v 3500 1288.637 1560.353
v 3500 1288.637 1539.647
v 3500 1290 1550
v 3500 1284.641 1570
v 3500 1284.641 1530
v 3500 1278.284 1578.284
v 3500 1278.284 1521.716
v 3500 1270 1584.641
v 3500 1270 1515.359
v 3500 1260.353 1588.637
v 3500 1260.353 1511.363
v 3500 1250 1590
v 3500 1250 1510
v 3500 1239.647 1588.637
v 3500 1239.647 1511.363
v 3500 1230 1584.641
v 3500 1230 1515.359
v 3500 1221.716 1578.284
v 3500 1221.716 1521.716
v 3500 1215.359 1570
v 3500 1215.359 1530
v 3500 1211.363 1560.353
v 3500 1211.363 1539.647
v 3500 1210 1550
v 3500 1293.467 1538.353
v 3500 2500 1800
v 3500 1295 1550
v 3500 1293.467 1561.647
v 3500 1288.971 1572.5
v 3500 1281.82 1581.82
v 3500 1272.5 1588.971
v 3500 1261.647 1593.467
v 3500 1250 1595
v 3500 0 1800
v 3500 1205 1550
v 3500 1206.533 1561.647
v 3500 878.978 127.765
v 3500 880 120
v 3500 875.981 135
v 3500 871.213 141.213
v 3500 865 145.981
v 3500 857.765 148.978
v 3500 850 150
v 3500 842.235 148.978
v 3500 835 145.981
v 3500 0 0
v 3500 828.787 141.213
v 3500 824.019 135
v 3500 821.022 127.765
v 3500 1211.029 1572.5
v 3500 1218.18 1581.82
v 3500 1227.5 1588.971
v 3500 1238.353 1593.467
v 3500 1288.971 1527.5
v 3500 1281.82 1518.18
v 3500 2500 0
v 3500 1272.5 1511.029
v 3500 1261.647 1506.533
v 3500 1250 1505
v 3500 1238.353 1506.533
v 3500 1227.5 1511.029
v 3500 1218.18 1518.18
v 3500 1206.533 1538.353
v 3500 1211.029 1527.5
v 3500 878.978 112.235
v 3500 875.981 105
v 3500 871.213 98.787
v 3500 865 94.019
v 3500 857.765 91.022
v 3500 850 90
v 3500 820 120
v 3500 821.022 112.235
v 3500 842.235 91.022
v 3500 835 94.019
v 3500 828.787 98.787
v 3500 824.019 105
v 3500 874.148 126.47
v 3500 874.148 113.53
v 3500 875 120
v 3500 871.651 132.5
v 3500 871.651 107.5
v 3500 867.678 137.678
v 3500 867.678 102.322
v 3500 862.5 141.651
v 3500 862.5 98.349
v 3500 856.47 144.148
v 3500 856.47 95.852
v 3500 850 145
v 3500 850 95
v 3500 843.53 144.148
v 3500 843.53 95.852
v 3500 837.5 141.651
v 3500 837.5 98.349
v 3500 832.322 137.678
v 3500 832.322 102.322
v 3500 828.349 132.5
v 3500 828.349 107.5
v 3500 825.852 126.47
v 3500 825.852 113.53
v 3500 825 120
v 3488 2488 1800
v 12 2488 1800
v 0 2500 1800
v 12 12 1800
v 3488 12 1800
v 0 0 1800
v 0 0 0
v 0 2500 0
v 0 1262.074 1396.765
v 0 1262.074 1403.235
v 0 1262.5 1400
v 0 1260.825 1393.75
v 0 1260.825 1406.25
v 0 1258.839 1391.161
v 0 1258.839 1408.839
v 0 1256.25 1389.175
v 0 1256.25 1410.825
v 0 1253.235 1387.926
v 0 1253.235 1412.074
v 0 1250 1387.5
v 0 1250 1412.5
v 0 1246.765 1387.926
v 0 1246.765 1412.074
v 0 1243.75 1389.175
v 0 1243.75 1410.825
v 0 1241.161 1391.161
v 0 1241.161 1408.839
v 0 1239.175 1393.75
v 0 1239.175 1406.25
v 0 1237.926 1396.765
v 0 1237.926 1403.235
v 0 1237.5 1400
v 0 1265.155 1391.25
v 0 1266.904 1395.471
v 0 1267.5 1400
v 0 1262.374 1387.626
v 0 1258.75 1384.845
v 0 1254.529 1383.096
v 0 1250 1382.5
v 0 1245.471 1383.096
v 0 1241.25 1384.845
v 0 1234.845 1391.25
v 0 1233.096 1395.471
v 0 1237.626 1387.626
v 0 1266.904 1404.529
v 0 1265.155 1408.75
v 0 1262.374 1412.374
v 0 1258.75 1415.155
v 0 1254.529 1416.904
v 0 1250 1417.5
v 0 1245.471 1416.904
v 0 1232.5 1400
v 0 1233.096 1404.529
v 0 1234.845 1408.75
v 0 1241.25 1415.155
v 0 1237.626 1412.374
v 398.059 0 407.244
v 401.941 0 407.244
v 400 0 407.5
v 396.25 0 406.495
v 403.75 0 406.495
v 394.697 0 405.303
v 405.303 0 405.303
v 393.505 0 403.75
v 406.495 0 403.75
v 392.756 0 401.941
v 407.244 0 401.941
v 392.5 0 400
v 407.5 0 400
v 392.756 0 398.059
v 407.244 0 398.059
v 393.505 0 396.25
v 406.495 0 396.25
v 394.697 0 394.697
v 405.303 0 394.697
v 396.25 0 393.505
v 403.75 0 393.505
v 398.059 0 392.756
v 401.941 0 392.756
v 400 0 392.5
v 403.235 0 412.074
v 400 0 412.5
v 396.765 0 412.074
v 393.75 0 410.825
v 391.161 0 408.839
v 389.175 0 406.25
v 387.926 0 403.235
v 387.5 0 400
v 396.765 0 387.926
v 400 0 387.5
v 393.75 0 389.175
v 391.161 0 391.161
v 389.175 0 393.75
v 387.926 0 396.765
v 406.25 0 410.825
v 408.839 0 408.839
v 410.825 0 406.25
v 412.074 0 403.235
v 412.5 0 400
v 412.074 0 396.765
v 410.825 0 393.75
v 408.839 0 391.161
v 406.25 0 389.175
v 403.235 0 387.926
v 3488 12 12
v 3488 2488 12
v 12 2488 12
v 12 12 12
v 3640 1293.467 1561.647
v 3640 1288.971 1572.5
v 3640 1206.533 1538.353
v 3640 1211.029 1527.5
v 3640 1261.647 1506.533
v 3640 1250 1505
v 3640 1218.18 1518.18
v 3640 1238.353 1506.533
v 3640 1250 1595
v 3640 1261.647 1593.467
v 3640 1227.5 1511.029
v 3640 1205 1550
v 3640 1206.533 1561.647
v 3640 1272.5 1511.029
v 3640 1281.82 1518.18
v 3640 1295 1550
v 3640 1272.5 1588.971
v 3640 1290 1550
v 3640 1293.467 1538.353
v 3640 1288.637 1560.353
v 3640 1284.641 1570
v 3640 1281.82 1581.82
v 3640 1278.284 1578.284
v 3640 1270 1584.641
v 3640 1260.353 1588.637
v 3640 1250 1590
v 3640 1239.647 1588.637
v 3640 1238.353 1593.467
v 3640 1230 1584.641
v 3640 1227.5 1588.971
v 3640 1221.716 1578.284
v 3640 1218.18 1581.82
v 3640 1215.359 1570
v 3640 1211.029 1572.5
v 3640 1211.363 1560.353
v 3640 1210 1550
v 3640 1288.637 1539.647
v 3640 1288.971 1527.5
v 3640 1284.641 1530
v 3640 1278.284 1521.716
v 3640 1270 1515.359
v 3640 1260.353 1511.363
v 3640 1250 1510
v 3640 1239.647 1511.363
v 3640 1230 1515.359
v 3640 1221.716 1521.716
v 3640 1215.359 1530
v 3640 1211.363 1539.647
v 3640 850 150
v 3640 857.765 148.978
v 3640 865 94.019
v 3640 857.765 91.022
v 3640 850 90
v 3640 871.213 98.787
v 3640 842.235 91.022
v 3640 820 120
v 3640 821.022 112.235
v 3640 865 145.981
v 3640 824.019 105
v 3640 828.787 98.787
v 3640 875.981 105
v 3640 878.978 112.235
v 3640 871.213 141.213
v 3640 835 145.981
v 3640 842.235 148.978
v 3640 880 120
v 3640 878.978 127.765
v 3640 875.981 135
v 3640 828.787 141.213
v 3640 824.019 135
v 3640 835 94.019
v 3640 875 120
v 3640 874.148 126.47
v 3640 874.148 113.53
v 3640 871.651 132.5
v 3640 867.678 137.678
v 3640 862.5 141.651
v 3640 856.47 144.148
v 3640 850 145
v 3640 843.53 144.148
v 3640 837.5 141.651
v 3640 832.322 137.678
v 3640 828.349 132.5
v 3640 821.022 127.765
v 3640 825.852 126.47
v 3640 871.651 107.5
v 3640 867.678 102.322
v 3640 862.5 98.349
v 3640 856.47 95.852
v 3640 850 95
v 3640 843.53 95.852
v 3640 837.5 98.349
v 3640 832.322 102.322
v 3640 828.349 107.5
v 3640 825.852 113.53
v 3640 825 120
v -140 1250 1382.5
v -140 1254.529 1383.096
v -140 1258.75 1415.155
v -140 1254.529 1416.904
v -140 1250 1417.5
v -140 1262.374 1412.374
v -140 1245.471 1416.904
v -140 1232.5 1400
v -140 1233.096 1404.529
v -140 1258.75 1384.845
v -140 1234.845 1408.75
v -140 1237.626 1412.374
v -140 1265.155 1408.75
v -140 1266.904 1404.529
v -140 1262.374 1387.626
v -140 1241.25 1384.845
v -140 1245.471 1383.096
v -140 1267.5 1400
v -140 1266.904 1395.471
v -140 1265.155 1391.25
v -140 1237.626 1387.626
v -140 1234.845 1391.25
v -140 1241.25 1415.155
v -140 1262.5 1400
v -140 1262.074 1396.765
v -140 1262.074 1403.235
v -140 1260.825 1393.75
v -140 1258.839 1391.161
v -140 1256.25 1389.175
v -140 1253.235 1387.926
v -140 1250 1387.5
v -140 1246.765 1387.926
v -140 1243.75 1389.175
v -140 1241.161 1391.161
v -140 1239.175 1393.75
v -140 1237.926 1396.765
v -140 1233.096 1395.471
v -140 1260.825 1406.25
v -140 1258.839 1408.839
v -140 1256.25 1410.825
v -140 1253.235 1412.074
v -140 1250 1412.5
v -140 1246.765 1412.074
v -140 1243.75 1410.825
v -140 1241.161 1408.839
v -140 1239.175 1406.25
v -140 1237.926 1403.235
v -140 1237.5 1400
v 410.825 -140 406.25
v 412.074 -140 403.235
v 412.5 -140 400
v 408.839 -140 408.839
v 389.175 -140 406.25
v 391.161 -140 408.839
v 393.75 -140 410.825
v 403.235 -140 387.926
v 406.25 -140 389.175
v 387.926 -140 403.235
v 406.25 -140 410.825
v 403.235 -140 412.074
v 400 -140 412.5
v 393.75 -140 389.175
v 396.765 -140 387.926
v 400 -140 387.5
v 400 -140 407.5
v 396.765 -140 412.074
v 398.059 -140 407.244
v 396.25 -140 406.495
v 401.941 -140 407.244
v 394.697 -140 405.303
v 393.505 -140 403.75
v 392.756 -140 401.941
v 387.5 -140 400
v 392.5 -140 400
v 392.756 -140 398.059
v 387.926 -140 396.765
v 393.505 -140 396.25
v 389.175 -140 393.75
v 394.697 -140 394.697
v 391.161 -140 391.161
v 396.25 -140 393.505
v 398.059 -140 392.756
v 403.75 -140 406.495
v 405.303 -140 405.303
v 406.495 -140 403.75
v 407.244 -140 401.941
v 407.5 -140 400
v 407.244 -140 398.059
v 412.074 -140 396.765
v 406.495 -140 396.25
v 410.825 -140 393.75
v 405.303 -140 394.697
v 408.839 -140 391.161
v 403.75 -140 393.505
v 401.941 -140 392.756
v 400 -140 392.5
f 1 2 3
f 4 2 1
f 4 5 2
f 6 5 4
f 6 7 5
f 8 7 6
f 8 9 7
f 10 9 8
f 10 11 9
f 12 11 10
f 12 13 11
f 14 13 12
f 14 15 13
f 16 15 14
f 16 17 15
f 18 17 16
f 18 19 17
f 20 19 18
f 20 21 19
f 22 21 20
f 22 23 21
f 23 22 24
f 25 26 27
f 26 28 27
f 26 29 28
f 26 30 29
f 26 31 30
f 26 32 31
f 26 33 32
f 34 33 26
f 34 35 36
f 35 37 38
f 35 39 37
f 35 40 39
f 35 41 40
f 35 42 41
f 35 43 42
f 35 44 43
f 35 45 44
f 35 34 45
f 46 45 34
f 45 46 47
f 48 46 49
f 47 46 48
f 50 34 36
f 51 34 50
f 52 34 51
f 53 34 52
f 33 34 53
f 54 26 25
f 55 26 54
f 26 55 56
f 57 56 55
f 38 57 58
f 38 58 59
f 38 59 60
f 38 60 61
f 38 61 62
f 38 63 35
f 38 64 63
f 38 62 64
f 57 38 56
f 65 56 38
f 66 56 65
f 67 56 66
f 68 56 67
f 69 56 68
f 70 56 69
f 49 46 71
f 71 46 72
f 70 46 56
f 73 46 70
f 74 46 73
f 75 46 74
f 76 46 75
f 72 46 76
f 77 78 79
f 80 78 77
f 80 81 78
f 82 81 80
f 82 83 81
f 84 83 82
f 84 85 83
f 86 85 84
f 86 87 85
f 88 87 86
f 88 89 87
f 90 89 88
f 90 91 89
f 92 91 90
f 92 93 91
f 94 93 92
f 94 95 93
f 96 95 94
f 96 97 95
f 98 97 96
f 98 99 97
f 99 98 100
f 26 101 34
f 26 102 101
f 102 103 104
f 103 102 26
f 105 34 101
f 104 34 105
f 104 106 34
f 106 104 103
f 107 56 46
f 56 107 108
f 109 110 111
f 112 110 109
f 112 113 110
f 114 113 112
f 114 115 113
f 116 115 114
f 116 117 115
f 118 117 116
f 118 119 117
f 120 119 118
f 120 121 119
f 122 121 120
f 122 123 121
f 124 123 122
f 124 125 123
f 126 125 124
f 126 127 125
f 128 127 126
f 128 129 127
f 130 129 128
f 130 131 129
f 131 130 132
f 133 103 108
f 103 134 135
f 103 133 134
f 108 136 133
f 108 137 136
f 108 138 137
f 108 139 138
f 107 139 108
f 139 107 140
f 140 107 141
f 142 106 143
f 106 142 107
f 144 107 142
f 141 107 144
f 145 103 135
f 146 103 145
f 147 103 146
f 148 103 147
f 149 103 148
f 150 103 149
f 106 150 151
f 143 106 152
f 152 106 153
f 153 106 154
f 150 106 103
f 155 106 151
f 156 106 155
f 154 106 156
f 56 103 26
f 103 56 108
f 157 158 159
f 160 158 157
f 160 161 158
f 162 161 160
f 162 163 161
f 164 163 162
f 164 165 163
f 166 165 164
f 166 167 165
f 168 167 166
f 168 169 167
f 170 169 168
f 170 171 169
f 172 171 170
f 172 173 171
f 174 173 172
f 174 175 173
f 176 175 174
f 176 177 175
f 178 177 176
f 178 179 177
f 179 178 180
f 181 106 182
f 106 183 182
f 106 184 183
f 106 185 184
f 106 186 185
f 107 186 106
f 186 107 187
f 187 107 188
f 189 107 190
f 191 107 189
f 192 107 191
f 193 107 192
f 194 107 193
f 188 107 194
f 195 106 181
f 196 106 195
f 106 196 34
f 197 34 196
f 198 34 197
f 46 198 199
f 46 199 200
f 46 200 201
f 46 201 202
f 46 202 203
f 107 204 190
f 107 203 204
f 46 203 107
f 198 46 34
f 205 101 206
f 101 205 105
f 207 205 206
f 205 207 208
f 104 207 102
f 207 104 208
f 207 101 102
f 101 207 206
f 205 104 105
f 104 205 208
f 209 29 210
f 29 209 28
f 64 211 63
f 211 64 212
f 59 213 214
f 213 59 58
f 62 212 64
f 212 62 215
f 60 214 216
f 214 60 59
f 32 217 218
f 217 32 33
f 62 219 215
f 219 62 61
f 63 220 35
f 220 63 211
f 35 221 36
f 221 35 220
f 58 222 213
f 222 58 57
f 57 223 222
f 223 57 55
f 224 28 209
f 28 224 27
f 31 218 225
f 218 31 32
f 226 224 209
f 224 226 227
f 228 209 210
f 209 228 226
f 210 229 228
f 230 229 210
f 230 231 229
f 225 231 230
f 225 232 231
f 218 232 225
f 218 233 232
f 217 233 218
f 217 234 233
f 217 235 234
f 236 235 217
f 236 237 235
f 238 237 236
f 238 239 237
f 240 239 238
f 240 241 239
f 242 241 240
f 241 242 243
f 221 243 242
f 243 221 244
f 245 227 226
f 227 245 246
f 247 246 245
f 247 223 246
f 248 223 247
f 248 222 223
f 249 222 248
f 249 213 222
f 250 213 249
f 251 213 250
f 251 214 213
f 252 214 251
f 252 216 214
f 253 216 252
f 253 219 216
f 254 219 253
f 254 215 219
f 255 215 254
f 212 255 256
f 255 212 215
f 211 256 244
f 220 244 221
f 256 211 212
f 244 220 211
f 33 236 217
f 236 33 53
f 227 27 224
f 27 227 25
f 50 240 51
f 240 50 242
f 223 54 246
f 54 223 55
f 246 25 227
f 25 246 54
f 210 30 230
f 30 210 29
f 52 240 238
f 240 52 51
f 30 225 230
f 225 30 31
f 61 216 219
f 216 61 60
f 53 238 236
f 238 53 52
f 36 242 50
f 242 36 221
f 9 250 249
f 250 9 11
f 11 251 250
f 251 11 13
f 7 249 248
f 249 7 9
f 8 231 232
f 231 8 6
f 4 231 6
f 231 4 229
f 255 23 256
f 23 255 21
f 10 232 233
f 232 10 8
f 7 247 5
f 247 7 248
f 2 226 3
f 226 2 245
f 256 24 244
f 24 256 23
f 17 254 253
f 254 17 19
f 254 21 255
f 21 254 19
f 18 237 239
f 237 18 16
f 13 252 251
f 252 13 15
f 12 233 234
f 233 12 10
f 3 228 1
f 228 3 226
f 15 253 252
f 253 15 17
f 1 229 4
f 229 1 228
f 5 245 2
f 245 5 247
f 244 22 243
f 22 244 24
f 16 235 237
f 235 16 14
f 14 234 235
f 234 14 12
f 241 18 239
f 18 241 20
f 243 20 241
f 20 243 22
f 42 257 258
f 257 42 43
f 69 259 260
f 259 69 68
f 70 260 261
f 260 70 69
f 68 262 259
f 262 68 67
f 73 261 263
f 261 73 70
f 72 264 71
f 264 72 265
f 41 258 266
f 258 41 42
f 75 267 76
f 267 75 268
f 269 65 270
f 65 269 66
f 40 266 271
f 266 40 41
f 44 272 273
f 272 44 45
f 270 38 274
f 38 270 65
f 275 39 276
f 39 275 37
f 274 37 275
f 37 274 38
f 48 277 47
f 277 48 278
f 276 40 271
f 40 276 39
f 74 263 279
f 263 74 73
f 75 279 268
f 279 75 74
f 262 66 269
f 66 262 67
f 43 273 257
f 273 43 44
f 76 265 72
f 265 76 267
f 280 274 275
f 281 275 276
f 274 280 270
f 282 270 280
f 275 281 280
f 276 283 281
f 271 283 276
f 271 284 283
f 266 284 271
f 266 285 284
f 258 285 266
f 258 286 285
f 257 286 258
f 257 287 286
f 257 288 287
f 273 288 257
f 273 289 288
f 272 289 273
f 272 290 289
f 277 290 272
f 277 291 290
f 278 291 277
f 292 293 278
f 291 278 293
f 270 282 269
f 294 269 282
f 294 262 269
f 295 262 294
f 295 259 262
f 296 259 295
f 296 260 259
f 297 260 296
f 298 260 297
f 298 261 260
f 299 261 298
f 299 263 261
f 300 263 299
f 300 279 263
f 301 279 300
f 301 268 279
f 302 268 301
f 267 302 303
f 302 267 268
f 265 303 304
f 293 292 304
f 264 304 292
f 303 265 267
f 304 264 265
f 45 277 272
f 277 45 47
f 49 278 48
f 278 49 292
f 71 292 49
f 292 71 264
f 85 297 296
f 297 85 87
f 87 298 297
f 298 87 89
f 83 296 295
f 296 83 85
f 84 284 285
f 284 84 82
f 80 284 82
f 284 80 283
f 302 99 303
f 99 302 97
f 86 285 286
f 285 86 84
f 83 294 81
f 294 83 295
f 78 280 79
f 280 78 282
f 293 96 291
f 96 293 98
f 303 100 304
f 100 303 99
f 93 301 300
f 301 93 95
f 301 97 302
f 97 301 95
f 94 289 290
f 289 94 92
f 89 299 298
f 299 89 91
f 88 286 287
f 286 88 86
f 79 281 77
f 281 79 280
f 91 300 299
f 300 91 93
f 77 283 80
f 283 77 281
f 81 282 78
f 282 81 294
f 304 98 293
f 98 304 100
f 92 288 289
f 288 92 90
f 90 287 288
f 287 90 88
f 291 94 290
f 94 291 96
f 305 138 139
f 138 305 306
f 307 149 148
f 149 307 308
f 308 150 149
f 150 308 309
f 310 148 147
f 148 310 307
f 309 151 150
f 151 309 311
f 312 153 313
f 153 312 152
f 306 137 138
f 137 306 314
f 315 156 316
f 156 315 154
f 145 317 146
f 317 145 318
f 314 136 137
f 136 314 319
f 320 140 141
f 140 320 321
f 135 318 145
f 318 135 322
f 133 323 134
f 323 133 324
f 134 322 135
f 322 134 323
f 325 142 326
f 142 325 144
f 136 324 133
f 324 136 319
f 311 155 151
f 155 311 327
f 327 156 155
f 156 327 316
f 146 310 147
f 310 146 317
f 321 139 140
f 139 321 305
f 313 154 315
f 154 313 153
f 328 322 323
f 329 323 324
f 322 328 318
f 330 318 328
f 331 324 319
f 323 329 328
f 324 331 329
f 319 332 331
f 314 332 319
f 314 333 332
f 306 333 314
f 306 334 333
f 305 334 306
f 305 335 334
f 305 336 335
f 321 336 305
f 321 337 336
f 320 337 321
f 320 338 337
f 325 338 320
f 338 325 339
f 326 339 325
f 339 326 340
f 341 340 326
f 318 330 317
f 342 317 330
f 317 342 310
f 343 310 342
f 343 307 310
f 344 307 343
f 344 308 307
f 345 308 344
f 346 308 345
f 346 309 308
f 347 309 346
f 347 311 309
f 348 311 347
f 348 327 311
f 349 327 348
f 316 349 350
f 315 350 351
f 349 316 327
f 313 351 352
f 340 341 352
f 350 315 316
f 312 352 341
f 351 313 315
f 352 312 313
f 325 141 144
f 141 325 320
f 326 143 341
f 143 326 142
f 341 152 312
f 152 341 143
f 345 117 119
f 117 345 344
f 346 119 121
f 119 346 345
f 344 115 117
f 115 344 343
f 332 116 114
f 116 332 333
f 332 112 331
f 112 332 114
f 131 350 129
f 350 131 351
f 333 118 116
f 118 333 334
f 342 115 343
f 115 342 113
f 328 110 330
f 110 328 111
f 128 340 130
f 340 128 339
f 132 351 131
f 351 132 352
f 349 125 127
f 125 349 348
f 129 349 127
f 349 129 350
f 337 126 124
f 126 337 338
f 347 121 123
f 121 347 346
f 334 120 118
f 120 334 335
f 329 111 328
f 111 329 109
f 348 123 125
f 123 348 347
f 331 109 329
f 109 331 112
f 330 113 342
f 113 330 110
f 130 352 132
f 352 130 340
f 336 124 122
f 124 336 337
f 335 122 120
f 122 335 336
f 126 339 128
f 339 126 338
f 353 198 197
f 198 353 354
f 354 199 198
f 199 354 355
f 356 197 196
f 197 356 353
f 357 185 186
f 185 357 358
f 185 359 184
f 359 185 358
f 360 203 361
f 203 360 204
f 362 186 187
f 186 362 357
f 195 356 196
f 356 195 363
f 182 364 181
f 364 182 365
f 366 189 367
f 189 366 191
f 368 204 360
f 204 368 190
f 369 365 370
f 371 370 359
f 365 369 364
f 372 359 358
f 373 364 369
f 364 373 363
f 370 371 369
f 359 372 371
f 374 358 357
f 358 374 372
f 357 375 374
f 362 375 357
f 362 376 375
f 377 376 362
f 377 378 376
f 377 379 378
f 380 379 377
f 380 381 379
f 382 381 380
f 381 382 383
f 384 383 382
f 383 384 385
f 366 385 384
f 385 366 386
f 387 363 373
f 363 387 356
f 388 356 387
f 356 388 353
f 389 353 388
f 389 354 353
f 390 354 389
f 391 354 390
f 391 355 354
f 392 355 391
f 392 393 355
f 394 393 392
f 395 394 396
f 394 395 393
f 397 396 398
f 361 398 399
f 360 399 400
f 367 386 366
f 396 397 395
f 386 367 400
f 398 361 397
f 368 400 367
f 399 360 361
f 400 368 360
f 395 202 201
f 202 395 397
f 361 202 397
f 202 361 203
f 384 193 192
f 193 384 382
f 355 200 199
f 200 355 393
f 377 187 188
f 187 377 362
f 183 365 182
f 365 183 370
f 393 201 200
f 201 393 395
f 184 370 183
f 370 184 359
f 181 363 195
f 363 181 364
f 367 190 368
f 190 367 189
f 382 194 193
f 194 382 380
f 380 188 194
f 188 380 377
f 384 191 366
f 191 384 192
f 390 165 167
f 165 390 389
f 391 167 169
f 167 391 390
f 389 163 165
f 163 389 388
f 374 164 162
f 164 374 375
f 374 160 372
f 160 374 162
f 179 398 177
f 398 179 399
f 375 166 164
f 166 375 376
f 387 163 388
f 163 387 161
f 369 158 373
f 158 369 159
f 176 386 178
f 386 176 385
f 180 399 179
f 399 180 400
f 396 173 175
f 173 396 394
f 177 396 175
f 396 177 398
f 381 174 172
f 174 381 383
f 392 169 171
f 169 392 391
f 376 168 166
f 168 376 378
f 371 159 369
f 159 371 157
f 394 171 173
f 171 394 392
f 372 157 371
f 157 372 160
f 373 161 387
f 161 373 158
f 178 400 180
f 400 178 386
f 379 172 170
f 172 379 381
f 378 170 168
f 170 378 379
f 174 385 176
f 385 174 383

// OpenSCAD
// file: ../params.scad
// Shared millimetre parameters. Keep in lockstep with freecad/params.py.
// Module scale: 150 kg/day wet train. Walls are CPVC sheet, not metal.

$fn = 36;

WALL        = 12;     // CPVC sheet thickness
FLOOR       = 16;     // floor plate (trough sits on this)

// LEACH CSTR 1 — inside liquor box
CSTR_L      = 2000;
CSTR_W      = 1200;
CSTR_H      = 1400;   // liquid + freeboard
FREEBOARD   = 200;

// CSTR 2 weir (same vessel, +X wall)
WEIR_W      = 450;
WEIR_CREST  = CSTR_H - FREEBOARD;   // from inner floor
WEIR_SLOT_H = 80;
WEIR_LIP    = 120;    // external spout projection

// CSTR 3 floor auger — injection-molded PVC / FG
AUGER_D     = 140;    // flight OD
AUGER_SHAFT = 40;
AUGER_PITCH = 110;
AUGER_TROUGH_W = 180;
AUGER_TROUGH_H = 110;
AUGER_OFFSET_Y = 280; // trough centreline from inner -Y wall
AUGER_INCLINE  = 28;  // deg, lifts out of liquor toward +X

// mixer / nozzles (lid)
MIXER_D     = 50;
GAS_D       = 80;     // acid-gas takeoff
DROP_X      = 80;     // inner-X of shred drop slot
DROP_L      = 400;
DROP_W      = 250;
DROP_COAM   = 80;     // raised coaming around the slot

// LEACHATE PUMP / coarse strainer — −X wall, opposite the weir
PUMP_D      = 80;     // DN80
PUMP_Z      = 450;    // centreline above inner floor (submerged)
PUMP_Y      = 900;    // centreline from inner −Y (away from auger)
STRAINER_L  = 180;
STRAINER_W  = 140;
STRAINER_H  = 160;

// mezzanine feed train
MEZZ_H      = 2200;   // platform top above tank outer floor
MEZZ_L      = 1600;   // platform length in −X
MEZZ_THK    = 12;
HOPPER_L    = 700;
HOPPER_W    = 600;
HOPPER_H    = 800;
SHRED_L     = 500;
SHRED_W     = 500;
SHRED_H     = 450;
CONV_W      = 240;
CONV_H      = 120;
CONV_PLATE  = 6;      // trough plate
CONV_FLANGE = 40;
CONV_SPRING_D = 50;
CONV_SPRING_H = 80;
CONV_BOLT   = 10;     // M10 clearance
CONV_LEN    = 1800;   // default standalone length; plant instance is computed
DUST_D      = 150;    // dust-hood outlet to DUST header
AUGER_LIFT_L = 700;

// dewater belts + split (Phase A 4–6)
FDEW_L      = 1800;
FDEW_W      = 450;
FDEW_H      = 80;
FDEW_RISE   = 120;    // solids end higher so liquor runs back to weir
SDEW_L      = 1400;
SDEW_W      = 220;
SDEW_H      = 80;
SPLIT_L     = 600;
SPLIT_W     = 500;
SPLIT_H     = 400;
STUB_L      = 400;
STUB_W      = 300;
STUB_H      = 250;

// EW funnel cell
EW_L        = 600;    // along aisle (overflow direction)
EW_W        = 420;    // anode-cathode depth
EW_H        = 650;    // rectangular body
EW_FUNNEL_H = 220;
EW_VALVE_D  = 50;
EW_VALVE_L  = 60;
EW_MEM_T    = 4;      // CEM
EW_SLOT     = 10;     // membrane cassette slot
EW_PITCH    = 750;    // aisle spacing, centre to centre
AISLE_X0    = 200;
AISLE_Y     = -(EW_W + 2*WALL) - 400;
AISLE_Z     = 400;
BUND_H      = 150;
BUND_PAD    = 250;
SUMP_L      = 400;
SUMP_W      = 400;
SUMP_H      = 300;
VDF_D       = 700;
VDF_L       = 900;
PAIL_W      = 180;
HDR_D       = 80;
HDR_Z       = 1400;
PYRO_D      = 320;
PYRO_L      = 2800;

// Campus envelopes — lockstep with freecad/params.py
FARM_X=12000; FARM_Y=8000; FARM_L=12000; FARM_W=8000; FARM_H=4500;
FAB_X=12000;  FAB_Y=-6000; FAB_L=8000;   FAB_W=6000;  FAB_H=4000;
HAB_X=-8000;  HAB_Y=8000;  HAB_L=8000;   HAB_W=6000;  HAB_H=3200;
CRYO_X=-6000; CRYO_Y=-4000; CRYO_L=4000; CRYO_W=3000; CRYO_H=3000;
MFG_X=2000;   MFG_Y=9000;  MFG_L=6000;   MFG_W=4000;  MFG_H=3500;

LIFE_Z_GREY=900; LIFE_Z_UPW=1100; LIFE_Z_ETCH=1300;
LIFE_Z_O2=2800; LIFE_Z_N2=3000; LIFE_Z_CO2=3200;
LIFE_D_GREY=50; LIFE_D_UPW=40; LIFE_D_ETCH=32;
LIFE_D_GAS=25; LIFE_D_CO2=40;
// main file
// FISH TANK — PP shell + F1–F4. Not a Salria vessel.
include <../params.scad>;
$fn = 24;
L=3500; W=2500; H=1800; T=12;

module stub(d, l=140) {
    difference() {
        cylinder(h=l, d=d+10);
        translate([0,0,-1]) cylinder(h=l+2, d=d);
    }
}

module mfg_fish_tank() {
    difference() {
        cube([L, W, H]);
        translate([T, T, T]) cube([L-2*T, W-2*T, H]);
    }
    // F1 overflow +X
    translate([L, W/2, H-250]) rotate([0,90,0]) stub(80);
    // F2 drain +X low
    translate([L, W/2-400, 120]) rotate([0,90,0]) stub(50);
    // F3 UPW −X
    translate([0, W/2, 1400]) rotate([0,-90,0]) stub(25);
    // F4 air −Y
    translate([400, 0, 400]) rotate([90,0,0]) stub(15);
}

mfg_fish_tank();
